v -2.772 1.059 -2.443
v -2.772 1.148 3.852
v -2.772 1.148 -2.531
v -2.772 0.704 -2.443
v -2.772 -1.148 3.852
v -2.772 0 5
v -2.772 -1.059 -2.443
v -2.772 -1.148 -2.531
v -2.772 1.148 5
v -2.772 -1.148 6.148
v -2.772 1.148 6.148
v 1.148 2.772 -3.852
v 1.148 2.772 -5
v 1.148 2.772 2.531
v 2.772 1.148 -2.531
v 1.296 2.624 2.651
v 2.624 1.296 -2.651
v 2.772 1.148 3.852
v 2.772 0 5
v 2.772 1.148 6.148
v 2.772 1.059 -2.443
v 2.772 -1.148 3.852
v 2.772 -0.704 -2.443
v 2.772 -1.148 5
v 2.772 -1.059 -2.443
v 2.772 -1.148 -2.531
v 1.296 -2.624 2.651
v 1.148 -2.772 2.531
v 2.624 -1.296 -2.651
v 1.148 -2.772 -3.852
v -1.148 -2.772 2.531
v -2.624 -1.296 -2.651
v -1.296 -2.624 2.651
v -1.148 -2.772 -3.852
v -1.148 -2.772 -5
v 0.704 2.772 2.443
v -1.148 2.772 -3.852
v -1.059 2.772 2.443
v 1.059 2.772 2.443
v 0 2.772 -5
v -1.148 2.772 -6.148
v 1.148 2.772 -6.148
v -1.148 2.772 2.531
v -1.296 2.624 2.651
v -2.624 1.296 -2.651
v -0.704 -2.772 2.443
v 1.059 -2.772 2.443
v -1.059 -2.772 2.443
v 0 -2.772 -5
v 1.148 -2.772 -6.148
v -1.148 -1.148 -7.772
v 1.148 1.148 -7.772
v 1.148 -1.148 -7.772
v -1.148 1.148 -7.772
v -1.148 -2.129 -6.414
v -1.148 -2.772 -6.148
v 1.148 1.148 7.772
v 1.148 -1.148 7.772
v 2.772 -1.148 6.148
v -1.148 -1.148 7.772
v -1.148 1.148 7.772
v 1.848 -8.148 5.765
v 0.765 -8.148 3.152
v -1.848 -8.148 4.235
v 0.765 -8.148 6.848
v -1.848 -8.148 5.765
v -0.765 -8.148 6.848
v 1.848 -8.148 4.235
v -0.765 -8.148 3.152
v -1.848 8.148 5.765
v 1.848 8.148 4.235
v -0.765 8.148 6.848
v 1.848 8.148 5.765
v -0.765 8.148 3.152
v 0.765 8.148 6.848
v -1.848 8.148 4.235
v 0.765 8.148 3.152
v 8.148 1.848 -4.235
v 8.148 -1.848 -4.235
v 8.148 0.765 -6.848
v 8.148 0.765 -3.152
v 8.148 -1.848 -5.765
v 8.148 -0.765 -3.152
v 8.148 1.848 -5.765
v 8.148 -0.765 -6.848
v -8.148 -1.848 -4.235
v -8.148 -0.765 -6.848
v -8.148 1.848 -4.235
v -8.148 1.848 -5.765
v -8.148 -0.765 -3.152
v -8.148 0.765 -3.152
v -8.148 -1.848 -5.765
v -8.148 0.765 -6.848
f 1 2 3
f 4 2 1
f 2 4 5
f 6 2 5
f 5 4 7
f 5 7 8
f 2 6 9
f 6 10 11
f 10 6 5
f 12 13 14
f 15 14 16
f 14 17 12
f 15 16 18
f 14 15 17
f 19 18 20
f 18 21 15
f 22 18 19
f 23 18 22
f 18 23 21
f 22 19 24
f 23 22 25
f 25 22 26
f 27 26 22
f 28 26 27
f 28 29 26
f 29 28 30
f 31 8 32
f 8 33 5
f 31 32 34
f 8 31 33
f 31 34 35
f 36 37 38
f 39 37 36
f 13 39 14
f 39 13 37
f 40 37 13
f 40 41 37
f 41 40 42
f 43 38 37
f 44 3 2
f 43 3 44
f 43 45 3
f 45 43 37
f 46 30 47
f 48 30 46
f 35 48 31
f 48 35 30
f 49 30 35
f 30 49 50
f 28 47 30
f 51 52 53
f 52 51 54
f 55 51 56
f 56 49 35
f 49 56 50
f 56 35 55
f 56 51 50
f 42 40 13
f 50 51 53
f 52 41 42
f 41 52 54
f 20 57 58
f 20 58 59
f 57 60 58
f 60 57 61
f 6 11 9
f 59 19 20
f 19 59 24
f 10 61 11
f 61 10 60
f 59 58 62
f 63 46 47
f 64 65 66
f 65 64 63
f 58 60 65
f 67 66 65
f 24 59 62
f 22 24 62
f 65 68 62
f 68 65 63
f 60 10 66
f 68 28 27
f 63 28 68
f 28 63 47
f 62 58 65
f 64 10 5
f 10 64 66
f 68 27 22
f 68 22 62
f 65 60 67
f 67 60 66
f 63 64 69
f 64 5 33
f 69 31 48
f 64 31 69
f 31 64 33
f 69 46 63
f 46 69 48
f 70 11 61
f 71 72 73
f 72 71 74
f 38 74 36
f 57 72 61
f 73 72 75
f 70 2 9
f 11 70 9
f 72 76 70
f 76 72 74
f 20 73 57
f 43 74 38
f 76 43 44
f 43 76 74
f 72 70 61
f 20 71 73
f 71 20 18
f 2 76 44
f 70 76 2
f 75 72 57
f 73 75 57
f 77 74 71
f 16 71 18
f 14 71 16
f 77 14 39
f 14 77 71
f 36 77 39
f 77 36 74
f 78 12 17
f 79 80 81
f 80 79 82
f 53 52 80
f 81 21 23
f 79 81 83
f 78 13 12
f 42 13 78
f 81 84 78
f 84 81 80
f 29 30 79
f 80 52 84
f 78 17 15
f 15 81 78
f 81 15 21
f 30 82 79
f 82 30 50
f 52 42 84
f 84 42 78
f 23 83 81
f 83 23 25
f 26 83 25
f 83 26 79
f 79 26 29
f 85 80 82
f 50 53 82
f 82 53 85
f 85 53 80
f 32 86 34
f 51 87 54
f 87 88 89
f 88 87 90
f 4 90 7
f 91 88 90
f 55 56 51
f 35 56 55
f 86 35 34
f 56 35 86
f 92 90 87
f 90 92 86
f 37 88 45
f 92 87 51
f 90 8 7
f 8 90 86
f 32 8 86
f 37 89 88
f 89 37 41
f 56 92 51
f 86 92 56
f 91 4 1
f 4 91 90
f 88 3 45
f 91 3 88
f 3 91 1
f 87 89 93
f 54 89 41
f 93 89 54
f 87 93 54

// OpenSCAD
/*Breackwater pize called Dolo
    Author : Miguel Molinos
    Date : 11/08/2016
*/
module dolo(H1 = 10, H2 = 7, R1 = 3, R2 = 2){


    /*Parámetros de diseño*/

    a = 2*R1*sin(45/2);

    /*Dolo*/ 
    rotate([0,0,-22.5])    
    union(){
    
        union(){    
        /*Pieza central*/
        cylinder(r=R1,h=H1,$fn=8,center=true);
        /*Galleta inferior*/
        rotate([90,0,22.5+90])
            translate([0,-5,0])
                rotate([0,0,22.5])
                    cylinder(r=R1,h=a,$fn=8,center=true);  
        /*Galleta superior*/
        rotate([90,0,22.5])
            translate([0,5,0])
                rotate([0,0,22.5])
                    cylinder(r=R1,h=a,$fn=8,center=true);    
                
        }

        /*Pieza superior*/
        union(){
            for (k=[0,180]){
                rotate([90,0,22.5+k])
                    translate([0,5,a/2])
                        rotate([0,0,22.5])
                            cylinder(r1=R1, r2=R2 ,h=H2,$fn=8); 
            }
        }

        /*Pieza inferior*/
        union(){
            for (k=[90,270]){
                rotate([90,0,22.5+k])
                    translate([0,-5,a/2])
                        rotate([0,0,22.5])
                            cylinder(r1=R1, r2=R2 ,h=H2,$fn=8); 
            }
        }

    }
}




dolo();
